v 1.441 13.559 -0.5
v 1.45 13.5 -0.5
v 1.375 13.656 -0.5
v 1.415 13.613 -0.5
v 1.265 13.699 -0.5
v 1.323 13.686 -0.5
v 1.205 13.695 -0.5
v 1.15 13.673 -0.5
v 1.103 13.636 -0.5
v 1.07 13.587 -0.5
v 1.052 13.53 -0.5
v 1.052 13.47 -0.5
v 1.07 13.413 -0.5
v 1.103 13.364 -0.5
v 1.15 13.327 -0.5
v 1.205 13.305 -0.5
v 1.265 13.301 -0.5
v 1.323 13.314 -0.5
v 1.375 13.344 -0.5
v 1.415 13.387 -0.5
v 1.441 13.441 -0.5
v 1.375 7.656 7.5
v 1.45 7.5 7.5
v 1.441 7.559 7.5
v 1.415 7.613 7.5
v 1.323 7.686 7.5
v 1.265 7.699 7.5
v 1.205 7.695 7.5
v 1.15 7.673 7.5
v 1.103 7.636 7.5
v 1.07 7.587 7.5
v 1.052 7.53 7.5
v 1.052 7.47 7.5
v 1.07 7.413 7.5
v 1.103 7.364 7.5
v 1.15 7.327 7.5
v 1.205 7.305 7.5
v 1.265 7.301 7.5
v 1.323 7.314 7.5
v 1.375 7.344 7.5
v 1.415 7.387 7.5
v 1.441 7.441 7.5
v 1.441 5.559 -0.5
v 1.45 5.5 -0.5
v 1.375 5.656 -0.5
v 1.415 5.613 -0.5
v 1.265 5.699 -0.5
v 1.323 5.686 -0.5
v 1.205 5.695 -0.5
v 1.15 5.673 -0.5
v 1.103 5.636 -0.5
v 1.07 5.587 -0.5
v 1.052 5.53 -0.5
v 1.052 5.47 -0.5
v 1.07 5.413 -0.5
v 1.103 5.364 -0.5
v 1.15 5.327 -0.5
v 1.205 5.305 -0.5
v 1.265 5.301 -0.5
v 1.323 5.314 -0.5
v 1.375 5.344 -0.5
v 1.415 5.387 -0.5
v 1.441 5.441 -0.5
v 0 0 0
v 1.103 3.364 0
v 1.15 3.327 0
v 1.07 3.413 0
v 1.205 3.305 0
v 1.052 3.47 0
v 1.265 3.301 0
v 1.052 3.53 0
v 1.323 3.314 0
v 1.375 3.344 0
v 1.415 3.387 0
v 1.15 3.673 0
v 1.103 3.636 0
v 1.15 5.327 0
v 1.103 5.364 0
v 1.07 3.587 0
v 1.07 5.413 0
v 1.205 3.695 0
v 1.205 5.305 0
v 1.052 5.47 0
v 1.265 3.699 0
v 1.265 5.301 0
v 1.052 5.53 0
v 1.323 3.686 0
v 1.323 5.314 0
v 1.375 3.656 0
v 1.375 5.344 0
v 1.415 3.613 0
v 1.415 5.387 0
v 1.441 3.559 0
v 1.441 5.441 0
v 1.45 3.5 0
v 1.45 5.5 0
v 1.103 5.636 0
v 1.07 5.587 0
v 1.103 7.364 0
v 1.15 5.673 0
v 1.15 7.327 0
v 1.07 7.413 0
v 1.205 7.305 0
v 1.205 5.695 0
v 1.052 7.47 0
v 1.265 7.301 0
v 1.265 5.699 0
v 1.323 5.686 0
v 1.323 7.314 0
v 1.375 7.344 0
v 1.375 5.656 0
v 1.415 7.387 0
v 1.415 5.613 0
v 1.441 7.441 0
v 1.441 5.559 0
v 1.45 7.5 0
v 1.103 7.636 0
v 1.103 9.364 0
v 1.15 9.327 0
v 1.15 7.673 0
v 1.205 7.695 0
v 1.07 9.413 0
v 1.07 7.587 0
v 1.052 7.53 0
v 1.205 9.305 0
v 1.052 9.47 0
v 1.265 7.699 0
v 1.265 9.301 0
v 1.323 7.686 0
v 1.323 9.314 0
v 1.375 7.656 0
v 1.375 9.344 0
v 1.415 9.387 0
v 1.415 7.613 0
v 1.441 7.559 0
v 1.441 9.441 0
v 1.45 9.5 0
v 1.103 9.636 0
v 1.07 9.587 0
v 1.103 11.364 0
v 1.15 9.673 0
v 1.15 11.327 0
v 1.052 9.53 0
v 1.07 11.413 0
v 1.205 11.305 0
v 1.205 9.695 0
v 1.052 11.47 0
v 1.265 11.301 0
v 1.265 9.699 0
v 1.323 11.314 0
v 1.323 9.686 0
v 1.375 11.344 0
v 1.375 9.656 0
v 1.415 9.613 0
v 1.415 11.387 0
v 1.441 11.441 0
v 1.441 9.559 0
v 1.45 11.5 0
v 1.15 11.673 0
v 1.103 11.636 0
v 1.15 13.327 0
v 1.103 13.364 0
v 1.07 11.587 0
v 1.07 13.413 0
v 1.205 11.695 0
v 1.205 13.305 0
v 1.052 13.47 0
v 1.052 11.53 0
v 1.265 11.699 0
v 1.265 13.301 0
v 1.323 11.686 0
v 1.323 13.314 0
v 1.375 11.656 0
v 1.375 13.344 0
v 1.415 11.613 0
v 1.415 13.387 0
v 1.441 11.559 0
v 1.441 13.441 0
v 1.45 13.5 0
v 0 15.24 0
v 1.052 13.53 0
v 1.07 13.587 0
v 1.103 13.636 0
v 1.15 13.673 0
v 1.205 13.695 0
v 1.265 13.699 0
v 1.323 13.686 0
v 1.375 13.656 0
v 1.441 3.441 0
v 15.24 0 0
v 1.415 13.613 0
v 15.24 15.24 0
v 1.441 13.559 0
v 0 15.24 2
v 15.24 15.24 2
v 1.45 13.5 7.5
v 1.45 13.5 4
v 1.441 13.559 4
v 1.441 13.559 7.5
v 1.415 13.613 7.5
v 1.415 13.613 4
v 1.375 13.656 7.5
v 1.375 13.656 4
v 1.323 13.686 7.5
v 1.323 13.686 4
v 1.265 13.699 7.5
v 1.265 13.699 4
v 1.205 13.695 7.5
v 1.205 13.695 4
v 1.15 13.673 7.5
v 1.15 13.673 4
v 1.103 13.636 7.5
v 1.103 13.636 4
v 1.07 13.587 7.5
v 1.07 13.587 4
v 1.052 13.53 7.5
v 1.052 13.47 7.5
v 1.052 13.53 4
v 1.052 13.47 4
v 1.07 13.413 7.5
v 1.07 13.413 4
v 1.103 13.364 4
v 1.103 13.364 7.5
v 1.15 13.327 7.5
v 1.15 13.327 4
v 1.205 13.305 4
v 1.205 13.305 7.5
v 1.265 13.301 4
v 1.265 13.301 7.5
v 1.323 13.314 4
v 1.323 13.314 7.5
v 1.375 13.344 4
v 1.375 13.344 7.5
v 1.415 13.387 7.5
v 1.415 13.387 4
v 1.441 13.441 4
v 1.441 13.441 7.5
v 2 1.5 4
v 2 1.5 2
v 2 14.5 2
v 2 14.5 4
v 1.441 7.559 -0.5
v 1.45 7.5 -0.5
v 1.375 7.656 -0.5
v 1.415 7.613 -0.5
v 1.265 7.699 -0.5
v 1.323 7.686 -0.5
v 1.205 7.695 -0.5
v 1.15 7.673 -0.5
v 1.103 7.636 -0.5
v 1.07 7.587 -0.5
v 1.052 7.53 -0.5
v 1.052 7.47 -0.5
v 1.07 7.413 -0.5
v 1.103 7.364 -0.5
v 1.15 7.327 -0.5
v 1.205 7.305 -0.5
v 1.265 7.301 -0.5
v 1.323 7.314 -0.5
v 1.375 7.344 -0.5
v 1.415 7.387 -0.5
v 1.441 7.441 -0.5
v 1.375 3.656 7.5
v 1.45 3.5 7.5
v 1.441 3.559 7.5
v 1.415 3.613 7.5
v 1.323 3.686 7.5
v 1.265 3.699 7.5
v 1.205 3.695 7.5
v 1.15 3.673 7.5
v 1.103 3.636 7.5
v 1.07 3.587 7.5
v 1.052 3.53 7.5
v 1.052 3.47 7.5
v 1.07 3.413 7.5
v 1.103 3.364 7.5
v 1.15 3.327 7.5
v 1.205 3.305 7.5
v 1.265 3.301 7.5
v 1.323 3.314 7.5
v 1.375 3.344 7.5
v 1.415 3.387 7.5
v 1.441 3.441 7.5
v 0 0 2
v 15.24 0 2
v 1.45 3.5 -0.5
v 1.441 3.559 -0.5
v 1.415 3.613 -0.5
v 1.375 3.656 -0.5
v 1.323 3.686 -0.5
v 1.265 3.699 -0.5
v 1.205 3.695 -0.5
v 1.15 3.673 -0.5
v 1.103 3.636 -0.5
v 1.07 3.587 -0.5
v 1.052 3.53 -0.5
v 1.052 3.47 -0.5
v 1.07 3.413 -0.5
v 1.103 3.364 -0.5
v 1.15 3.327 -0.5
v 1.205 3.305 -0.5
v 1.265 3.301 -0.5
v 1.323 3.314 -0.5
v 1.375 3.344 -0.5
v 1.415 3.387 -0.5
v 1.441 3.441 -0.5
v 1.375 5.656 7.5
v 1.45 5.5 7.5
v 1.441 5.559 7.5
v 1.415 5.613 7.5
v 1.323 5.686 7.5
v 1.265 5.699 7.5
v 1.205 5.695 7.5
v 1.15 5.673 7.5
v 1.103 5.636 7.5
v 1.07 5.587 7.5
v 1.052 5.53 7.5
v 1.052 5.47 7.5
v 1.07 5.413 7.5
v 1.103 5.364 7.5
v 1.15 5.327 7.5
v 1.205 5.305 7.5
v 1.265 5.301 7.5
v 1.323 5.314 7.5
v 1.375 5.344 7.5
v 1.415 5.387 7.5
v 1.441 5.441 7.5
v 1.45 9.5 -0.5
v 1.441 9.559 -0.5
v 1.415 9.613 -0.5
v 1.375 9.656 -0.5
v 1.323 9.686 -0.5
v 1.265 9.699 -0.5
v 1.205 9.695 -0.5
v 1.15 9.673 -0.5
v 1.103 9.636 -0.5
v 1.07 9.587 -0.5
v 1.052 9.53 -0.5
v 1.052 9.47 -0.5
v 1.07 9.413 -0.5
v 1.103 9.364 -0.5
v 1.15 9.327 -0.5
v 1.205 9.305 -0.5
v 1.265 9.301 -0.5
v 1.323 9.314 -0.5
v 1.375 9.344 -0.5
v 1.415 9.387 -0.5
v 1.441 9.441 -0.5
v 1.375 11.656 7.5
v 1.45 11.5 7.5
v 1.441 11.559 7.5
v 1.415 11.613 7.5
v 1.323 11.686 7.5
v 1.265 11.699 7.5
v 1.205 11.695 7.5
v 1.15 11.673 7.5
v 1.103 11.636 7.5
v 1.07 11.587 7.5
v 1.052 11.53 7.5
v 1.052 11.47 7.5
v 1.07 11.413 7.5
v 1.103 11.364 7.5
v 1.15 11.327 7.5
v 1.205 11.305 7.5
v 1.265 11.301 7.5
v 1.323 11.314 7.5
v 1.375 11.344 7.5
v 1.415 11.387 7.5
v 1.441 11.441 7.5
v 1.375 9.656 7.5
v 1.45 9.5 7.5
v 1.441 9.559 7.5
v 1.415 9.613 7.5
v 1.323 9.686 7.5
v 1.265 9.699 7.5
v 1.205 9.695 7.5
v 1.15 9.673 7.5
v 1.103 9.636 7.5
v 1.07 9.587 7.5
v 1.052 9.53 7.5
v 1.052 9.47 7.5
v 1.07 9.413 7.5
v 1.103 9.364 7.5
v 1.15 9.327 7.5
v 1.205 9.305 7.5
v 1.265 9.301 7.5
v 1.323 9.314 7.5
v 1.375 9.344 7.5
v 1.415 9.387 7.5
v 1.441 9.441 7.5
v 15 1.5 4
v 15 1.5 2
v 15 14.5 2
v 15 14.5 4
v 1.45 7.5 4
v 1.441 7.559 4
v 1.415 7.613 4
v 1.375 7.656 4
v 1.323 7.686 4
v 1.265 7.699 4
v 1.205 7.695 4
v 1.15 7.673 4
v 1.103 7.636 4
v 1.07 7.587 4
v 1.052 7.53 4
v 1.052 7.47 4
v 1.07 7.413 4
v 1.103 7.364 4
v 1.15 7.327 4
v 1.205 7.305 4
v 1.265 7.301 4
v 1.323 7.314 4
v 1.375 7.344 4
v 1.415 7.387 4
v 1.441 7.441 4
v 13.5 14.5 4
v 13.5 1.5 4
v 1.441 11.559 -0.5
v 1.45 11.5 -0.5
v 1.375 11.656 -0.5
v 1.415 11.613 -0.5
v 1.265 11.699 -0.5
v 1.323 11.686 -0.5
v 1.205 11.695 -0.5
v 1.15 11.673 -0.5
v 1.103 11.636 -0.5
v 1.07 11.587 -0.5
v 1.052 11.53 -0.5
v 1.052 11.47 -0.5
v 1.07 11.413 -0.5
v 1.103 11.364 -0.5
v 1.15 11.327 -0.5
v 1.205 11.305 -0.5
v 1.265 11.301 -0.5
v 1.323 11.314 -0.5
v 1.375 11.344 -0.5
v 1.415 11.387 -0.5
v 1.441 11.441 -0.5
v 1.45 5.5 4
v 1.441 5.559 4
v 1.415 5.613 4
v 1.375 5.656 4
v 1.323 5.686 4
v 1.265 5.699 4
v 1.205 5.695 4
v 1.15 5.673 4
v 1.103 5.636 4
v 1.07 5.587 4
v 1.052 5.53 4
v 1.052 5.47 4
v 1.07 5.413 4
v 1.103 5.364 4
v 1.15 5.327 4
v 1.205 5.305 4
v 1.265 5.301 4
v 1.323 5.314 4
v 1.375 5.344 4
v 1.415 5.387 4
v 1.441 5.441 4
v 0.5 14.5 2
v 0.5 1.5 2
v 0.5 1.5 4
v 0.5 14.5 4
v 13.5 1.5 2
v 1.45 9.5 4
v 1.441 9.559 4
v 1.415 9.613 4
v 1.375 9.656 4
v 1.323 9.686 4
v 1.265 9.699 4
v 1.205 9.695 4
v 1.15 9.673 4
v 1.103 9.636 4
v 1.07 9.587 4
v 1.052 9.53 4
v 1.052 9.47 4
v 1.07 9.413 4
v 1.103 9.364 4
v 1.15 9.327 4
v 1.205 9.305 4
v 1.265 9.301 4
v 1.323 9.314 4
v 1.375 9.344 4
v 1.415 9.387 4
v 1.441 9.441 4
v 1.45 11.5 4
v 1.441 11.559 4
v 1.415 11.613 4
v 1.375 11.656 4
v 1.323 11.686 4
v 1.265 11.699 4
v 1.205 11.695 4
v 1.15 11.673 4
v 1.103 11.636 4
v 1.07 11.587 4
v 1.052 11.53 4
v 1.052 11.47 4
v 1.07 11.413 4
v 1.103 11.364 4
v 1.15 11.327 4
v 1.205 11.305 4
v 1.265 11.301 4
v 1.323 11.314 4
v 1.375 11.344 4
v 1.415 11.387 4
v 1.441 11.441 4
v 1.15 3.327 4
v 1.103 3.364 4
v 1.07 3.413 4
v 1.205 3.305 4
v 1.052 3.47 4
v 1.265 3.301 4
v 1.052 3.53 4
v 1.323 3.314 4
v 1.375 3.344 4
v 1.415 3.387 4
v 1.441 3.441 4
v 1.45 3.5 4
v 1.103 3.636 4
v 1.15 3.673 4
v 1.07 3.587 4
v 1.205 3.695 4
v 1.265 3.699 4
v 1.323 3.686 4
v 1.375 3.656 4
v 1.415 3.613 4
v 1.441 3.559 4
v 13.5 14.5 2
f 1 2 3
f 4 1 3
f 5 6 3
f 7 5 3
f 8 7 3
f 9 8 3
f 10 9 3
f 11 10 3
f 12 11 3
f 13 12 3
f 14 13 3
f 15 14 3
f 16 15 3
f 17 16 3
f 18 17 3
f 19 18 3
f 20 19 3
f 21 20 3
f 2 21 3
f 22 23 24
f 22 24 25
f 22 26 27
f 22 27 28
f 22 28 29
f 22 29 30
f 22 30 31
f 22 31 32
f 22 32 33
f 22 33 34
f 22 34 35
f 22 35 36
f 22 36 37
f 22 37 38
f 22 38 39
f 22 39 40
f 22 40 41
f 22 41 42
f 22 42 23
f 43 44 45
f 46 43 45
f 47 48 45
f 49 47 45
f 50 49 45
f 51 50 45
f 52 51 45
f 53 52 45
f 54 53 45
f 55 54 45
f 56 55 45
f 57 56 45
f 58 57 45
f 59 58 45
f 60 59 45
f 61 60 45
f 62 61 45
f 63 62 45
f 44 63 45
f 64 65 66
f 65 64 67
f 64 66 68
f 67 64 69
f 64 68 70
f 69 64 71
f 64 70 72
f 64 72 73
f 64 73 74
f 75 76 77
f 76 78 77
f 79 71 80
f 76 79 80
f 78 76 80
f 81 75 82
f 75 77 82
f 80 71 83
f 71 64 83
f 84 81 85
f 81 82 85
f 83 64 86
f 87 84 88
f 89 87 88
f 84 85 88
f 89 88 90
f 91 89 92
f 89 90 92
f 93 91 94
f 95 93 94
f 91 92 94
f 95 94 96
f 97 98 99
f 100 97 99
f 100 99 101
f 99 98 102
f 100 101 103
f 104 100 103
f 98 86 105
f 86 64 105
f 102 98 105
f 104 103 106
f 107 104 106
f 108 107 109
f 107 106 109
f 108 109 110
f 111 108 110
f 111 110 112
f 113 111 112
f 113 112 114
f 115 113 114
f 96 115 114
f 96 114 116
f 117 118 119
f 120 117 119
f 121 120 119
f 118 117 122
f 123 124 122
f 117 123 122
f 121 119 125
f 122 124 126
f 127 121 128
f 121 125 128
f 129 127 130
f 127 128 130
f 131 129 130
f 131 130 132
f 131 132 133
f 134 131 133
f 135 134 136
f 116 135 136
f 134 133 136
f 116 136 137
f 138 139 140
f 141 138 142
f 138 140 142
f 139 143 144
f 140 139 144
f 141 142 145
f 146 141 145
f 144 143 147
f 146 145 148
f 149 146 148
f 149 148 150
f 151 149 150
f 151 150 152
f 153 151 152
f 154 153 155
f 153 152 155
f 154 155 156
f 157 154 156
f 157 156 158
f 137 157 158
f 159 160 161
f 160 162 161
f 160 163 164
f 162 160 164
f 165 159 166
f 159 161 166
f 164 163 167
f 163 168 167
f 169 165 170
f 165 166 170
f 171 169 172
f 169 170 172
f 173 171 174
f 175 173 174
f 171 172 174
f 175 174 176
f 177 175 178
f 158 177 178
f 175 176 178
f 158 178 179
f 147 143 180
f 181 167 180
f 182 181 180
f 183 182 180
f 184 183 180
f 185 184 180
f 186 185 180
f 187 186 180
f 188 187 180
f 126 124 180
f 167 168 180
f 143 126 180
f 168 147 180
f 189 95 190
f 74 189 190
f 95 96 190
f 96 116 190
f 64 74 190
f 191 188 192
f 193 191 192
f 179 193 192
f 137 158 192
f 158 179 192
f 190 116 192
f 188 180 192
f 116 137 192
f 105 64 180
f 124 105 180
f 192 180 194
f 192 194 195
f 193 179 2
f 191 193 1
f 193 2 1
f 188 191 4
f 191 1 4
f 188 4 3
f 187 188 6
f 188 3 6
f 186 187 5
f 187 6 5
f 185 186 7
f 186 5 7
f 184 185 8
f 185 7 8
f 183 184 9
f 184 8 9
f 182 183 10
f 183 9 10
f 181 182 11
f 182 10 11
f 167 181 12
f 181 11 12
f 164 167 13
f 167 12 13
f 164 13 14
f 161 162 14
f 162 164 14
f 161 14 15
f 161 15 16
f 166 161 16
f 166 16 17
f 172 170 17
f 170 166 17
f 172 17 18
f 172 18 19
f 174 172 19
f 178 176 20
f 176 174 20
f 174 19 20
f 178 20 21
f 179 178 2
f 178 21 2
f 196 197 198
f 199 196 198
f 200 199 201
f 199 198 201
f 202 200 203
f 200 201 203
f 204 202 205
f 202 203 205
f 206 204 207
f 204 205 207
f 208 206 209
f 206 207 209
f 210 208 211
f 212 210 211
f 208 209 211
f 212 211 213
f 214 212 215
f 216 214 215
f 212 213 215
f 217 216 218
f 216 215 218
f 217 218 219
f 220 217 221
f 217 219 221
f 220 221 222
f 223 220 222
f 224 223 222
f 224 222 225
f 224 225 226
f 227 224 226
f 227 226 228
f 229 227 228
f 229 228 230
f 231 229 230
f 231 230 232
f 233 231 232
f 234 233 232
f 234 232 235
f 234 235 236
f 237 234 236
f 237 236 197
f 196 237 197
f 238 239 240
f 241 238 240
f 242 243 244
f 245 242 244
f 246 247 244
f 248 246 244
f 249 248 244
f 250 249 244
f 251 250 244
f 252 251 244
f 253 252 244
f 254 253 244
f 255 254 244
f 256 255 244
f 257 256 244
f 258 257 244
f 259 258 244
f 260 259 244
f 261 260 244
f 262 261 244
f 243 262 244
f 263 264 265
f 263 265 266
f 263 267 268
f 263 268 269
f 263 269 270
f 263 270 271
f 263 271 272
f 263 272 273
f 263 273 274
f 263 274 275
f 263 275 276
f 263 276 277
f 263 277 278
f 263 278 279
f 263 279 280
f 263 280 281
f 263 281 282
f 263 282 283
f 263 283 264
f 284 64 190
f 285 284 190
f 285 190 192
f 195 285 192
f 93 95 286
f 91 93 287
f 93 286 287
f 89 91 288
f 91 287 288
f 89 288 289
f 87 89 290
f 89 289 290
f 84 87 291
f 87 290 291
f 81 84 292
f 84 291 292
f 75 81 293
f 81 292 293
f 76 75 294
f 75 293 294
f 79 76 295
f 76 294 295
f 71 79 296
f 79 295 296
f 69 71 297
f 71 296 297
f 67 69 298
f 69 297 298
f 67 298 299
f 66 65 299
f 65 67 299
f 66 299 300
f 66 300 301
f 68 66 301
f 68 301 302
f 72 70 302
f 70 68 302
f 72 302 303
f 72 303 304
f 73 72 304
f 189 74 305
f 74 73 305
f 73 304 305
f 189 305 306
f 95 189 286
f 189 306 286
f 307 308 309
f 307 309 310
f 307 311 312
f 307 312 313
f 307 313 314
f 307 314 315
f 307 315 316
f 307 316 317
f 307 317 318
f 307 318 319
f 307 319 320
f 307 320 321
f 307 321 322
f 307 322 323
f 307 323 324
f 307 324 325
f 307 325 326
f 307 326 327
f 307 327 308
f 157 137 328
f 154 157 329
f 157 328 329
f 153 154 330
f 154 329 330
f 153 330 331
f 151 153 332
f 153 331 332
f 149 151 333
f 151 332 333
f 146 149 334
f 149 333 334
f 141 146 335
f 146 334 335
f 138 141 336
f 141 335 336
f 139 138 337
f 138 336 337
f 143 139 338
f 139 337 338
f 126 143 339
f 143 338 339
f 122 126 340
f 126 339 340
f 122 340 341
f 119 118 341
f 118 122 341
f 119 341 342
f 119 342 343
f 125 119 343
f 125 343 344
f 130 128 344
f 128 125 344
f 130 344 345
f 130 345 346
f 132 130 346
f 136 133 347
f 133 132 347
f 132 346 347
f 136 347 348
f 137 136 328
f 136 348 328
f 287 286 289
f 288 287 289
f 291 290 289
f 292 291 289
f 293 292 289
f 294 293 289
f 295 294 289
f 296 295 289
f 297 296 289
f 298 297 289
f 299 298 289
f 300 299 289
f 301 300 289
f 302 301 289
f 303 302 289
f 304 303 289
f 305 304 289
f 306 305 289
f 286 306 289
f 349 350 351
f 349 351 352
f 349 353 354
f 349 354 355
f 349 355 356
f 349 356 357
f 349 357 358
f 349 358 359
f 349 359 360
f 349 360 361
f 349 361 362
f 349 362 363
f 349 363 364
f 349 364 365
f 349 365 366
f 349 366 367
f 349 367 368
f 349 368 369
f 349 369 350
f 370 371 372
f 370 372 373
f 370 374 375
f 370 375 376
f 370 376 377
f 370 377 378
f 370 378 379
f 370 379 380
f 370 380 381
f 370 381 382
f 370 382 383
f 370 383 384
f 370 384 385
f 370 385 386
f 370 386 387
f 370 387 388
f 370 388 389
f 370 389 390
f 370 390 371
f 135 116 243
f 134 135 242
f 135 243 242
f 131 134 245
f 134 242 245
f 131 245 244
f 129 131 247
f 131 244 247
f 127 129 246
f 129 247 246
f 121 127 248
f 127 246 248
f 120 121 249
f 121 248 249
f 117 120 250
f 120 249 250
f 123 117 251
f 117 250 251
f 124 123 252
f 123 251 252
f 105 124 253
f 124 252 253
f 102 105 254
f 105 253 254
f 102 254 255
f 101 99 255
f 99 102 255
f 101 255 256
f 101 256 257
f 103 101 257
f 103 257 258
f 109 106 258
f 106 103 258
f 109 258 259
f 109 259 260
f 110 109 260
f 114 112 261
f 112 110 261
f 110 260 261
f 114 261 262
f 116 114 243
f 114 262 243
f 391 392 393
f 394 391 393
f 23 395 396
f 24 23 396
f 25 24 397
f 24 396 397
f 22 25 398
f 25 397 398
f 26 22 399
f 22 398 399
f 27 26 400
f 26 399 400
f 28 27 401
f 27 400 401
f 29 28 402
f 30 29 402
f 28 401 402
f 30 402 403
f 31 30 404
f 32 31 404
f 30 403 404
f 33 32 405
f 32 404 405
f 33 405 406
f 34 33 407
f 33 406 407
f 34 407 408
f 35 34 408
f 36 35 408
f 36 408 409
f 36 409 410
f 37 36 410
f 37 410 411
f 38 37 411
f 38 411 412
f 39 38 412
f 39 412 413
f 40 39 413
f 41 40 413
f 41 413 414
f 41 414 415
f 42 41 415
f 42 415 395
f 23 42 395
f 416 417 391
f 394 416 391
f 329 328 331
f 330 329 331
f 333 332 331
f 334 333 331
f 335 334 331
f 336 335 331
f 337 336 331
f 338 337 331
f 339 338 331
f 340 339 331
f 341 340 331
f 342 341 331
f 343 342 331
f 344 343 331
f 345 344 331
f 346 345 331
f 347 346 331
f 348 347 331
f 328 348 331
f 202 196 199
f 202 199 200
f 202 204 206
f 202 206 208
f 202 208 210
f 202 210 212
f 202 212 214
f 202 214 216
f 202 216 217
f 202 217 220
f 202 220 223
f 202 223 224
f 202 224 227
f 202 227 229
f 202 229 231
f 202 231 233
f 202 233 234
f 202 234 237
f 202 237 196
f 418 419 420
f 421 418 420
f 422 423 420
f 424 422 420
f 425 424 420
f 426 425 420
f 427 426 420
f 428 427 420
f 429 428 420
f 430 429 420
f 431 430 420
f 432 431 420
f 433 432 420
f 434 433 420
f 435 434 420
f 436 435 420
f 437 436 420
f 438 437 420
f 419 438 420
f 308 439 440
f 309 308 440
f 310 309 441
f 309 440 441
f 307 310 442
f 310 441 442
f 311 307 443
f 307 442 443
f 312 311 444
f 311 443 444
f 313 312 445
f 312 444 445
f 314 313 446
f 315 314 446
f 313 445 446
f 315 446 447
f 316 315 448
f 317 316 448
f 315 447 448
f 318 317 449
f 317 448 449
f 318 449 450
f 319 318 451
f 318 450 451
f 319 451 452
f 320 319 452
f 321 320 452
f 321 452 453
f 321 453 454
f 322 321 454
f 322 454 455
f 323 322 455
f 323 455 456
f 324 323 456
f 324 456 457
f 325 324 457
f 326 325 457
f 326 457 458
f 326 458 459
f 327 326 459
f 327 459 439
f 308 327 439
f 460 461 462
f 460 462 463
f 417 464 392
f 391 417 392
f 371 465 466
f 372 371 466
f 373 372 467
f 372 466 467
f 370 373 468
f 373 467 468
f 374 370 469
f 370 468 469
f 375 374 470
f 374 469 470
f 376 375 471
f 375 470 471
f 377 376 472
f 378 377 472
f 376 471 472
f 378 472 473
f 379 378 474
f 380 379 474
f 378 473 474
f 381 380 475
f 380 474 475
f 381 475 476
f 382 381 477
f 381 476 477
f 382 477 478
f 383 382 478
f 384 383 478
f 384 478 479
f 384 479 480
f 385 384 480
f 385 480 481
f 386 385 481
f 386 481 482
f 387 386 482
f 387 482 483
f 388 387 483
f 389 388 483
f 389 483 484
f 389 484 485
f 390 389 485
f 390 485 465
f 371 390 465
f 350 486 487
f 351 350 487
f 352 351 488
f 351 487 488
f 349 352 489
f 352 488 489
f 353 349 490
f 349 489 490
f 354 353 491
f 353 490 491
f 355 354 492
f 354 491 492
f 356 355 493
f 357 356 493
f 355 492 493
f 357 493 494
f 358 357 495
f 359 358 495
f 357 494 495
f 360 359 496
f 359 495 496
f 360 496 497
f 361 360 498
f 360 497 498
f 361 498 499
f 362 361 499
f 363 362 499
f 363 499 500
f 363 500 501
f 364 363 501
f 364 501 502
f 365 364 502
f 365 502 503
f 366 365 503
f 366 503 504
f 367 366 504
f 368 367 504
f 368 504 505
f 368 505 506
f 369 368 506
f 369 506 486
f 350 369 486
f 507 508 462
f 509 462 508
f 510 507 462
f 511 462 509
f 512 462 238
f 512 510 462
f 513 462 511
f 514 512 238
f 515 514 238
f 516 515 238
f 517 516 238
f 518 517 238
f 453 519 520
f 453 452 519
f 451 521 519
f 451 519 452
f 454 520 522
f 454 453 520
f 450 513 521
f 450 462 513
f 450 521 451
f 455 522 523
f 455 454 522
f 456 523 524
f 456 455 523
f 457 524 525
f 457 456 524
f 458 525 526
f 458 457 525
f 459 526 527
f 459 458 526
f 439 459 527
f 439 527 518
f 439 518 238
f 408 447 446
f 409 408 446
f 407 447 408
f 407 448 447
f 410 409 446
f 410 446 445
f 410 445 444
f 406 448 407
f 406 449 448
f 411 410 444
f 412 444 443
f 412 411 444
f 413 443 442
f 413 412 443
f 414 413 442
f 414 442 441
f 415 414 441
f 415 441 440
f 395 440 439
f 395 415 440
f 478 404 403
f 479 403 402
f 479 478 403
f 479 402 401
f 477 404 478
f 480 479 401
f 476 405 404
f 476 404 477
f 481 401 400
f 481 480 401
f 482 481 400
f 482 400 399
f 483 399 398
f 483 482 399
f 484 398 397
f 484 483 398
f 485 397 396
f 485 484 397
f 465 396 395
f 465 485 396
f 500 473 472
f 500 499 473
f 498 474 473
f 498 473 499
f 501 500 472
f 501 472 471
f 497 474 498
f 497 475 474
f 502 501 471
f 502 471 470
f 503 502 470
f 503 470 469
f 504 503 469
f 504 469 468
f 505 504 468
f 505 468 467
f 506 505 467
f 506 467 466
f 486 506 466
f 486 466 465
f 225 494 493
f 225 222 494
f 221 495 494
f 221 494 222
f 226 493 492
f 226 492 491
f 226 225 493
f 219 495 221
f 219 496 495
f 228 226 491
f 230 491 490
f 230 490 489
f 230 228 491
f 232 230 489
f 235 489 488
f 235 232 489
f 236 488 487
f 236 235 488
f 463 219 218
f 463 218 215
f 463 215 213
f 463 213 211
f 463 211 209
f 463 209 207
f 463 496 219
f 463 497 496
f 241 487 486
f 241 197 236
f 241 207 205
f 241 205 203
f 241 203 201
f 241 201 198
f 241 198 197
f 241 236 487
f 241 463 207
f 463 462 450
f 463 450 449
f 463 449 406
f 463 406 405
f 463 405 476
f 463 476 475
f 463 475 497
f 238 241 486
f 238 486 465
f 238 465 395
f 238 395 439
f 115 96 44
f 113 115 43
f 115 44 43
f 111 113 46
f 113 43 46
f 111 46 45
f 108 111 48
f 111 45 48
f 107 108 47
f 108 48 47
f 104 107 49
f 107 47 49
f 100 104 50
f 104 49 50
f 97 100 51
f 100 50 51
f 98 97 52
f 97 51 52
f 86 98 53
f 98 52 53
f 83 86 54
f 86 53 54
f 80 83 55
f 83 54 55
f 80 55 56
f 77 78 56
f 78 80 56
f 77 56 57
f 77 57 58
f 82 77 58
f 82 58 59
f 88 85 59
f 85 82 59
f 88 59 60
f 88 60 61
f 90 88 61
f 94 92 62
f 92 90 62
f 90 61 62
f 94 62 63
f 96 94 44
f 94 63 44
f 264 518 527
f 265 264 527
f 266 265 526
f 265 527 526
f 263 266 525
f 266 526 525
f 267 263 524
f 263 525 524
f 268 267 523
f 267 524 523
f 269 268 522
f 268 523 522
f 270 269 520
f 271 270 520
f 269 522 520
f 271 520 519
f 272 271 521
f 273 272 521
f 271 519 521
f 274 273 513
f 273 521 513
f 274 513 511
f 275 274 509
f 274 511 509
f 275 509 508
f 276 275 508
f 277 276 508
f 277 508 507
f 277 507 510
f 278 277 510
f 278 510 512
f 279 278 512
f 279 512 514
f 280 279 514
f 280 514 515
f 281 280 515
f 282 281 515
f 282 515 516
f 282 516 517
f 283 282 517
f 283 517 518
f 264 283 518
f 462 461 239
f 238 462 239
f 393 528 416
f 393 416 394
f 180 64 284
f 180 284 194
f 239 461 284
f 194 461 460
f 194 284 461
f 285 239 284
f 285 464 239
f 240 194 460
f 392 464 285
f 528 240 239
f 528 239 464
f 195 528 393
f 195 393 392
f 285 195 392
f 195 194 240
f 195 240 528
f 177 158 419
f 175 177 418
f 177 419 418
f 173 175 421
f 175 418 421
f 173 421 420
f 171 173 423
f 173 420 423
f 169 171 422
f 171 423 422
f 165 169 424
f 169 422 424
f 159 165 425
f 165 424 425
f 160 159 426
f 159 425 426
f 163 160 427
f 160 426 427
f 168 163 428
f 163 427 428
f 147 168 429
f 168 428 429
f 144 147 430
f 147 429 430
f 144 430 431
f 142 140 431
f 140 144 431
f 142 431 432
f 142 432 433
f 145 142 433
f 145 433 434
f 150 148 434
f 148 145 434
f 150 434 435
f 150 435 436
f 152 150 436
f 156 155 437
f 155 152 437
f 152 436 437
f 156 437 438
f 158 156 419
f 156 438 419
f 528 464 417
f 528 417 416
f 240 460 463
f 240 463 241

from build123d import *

# Parameters (mm, degrees)
SKETCH_1_W           = 15.24
SKETCH_1_H           = 15.24
EXTRUDE_1_DEPTH      = 2
SKETCH_2_W           = 1.5
SKETCH_2_H           = 13
EXTRUDE_2_DEPTH      = 2
EXTRUDE_3_DEPTH      = 3.5
EXTRUDE_3_DEPTH_BACK = 4.5
SKETCH_3_R           = 0.2


with BuildPart() as part:
    # 草图1 → 凸台-拉伸1 (new body)
    with BuildSketch(Plane.XY):
        with Locations((7.62, 7.62)):
            Rectangle(SKETCH_1_W, SKETCH_1_H)
    extrude(amount=EXTRUDE_1_DEPTH)

    # 草图2 → 凸台-拉伸2 (add)
    with BuildSketch(Plane.XY.offset(2)):
        with Locations((14.25, 8)):
            Rectangle(SKETCH_2_W, SKETCH_2_H)
        with Locations((1.25, 8)):
            Rectangle(SKETCH_2_W, SKETCH_2_H)
    extrude(amount=EXTRUDE_2_DEPTH)

    # 草图3 → 凸台-拉伸3 (add, two sides: drawn at the far end of the back side and taken through both)
    with BuildSketch(Plane.XY.offset(4).offset(-EXTRUDE_3_DEPTH_BACK)):
        with Locations((1.25, 13.5)):
            Circle(SKETCH_3_R)
        with Locations((1.25, 11.5)):
            Circle(SKETCH_3_R)
        with Locations((1.25, 9.5)):
            Circle(SKETCH_3_R)
        with Locations((1.25, 7.5)):
            Circle(SKETCH_3_R)
        with Locations((1.25, 5.5)):
            Circle(SKETCH_3_R)
        with Locations((1.25, 3.5)):
            Circle(SKETCH_3_R)
    extrude(amount=EXTRUDE_3_DEPTH + EXTRUDE_3_DEPTH_BACK)


solid = part.part
